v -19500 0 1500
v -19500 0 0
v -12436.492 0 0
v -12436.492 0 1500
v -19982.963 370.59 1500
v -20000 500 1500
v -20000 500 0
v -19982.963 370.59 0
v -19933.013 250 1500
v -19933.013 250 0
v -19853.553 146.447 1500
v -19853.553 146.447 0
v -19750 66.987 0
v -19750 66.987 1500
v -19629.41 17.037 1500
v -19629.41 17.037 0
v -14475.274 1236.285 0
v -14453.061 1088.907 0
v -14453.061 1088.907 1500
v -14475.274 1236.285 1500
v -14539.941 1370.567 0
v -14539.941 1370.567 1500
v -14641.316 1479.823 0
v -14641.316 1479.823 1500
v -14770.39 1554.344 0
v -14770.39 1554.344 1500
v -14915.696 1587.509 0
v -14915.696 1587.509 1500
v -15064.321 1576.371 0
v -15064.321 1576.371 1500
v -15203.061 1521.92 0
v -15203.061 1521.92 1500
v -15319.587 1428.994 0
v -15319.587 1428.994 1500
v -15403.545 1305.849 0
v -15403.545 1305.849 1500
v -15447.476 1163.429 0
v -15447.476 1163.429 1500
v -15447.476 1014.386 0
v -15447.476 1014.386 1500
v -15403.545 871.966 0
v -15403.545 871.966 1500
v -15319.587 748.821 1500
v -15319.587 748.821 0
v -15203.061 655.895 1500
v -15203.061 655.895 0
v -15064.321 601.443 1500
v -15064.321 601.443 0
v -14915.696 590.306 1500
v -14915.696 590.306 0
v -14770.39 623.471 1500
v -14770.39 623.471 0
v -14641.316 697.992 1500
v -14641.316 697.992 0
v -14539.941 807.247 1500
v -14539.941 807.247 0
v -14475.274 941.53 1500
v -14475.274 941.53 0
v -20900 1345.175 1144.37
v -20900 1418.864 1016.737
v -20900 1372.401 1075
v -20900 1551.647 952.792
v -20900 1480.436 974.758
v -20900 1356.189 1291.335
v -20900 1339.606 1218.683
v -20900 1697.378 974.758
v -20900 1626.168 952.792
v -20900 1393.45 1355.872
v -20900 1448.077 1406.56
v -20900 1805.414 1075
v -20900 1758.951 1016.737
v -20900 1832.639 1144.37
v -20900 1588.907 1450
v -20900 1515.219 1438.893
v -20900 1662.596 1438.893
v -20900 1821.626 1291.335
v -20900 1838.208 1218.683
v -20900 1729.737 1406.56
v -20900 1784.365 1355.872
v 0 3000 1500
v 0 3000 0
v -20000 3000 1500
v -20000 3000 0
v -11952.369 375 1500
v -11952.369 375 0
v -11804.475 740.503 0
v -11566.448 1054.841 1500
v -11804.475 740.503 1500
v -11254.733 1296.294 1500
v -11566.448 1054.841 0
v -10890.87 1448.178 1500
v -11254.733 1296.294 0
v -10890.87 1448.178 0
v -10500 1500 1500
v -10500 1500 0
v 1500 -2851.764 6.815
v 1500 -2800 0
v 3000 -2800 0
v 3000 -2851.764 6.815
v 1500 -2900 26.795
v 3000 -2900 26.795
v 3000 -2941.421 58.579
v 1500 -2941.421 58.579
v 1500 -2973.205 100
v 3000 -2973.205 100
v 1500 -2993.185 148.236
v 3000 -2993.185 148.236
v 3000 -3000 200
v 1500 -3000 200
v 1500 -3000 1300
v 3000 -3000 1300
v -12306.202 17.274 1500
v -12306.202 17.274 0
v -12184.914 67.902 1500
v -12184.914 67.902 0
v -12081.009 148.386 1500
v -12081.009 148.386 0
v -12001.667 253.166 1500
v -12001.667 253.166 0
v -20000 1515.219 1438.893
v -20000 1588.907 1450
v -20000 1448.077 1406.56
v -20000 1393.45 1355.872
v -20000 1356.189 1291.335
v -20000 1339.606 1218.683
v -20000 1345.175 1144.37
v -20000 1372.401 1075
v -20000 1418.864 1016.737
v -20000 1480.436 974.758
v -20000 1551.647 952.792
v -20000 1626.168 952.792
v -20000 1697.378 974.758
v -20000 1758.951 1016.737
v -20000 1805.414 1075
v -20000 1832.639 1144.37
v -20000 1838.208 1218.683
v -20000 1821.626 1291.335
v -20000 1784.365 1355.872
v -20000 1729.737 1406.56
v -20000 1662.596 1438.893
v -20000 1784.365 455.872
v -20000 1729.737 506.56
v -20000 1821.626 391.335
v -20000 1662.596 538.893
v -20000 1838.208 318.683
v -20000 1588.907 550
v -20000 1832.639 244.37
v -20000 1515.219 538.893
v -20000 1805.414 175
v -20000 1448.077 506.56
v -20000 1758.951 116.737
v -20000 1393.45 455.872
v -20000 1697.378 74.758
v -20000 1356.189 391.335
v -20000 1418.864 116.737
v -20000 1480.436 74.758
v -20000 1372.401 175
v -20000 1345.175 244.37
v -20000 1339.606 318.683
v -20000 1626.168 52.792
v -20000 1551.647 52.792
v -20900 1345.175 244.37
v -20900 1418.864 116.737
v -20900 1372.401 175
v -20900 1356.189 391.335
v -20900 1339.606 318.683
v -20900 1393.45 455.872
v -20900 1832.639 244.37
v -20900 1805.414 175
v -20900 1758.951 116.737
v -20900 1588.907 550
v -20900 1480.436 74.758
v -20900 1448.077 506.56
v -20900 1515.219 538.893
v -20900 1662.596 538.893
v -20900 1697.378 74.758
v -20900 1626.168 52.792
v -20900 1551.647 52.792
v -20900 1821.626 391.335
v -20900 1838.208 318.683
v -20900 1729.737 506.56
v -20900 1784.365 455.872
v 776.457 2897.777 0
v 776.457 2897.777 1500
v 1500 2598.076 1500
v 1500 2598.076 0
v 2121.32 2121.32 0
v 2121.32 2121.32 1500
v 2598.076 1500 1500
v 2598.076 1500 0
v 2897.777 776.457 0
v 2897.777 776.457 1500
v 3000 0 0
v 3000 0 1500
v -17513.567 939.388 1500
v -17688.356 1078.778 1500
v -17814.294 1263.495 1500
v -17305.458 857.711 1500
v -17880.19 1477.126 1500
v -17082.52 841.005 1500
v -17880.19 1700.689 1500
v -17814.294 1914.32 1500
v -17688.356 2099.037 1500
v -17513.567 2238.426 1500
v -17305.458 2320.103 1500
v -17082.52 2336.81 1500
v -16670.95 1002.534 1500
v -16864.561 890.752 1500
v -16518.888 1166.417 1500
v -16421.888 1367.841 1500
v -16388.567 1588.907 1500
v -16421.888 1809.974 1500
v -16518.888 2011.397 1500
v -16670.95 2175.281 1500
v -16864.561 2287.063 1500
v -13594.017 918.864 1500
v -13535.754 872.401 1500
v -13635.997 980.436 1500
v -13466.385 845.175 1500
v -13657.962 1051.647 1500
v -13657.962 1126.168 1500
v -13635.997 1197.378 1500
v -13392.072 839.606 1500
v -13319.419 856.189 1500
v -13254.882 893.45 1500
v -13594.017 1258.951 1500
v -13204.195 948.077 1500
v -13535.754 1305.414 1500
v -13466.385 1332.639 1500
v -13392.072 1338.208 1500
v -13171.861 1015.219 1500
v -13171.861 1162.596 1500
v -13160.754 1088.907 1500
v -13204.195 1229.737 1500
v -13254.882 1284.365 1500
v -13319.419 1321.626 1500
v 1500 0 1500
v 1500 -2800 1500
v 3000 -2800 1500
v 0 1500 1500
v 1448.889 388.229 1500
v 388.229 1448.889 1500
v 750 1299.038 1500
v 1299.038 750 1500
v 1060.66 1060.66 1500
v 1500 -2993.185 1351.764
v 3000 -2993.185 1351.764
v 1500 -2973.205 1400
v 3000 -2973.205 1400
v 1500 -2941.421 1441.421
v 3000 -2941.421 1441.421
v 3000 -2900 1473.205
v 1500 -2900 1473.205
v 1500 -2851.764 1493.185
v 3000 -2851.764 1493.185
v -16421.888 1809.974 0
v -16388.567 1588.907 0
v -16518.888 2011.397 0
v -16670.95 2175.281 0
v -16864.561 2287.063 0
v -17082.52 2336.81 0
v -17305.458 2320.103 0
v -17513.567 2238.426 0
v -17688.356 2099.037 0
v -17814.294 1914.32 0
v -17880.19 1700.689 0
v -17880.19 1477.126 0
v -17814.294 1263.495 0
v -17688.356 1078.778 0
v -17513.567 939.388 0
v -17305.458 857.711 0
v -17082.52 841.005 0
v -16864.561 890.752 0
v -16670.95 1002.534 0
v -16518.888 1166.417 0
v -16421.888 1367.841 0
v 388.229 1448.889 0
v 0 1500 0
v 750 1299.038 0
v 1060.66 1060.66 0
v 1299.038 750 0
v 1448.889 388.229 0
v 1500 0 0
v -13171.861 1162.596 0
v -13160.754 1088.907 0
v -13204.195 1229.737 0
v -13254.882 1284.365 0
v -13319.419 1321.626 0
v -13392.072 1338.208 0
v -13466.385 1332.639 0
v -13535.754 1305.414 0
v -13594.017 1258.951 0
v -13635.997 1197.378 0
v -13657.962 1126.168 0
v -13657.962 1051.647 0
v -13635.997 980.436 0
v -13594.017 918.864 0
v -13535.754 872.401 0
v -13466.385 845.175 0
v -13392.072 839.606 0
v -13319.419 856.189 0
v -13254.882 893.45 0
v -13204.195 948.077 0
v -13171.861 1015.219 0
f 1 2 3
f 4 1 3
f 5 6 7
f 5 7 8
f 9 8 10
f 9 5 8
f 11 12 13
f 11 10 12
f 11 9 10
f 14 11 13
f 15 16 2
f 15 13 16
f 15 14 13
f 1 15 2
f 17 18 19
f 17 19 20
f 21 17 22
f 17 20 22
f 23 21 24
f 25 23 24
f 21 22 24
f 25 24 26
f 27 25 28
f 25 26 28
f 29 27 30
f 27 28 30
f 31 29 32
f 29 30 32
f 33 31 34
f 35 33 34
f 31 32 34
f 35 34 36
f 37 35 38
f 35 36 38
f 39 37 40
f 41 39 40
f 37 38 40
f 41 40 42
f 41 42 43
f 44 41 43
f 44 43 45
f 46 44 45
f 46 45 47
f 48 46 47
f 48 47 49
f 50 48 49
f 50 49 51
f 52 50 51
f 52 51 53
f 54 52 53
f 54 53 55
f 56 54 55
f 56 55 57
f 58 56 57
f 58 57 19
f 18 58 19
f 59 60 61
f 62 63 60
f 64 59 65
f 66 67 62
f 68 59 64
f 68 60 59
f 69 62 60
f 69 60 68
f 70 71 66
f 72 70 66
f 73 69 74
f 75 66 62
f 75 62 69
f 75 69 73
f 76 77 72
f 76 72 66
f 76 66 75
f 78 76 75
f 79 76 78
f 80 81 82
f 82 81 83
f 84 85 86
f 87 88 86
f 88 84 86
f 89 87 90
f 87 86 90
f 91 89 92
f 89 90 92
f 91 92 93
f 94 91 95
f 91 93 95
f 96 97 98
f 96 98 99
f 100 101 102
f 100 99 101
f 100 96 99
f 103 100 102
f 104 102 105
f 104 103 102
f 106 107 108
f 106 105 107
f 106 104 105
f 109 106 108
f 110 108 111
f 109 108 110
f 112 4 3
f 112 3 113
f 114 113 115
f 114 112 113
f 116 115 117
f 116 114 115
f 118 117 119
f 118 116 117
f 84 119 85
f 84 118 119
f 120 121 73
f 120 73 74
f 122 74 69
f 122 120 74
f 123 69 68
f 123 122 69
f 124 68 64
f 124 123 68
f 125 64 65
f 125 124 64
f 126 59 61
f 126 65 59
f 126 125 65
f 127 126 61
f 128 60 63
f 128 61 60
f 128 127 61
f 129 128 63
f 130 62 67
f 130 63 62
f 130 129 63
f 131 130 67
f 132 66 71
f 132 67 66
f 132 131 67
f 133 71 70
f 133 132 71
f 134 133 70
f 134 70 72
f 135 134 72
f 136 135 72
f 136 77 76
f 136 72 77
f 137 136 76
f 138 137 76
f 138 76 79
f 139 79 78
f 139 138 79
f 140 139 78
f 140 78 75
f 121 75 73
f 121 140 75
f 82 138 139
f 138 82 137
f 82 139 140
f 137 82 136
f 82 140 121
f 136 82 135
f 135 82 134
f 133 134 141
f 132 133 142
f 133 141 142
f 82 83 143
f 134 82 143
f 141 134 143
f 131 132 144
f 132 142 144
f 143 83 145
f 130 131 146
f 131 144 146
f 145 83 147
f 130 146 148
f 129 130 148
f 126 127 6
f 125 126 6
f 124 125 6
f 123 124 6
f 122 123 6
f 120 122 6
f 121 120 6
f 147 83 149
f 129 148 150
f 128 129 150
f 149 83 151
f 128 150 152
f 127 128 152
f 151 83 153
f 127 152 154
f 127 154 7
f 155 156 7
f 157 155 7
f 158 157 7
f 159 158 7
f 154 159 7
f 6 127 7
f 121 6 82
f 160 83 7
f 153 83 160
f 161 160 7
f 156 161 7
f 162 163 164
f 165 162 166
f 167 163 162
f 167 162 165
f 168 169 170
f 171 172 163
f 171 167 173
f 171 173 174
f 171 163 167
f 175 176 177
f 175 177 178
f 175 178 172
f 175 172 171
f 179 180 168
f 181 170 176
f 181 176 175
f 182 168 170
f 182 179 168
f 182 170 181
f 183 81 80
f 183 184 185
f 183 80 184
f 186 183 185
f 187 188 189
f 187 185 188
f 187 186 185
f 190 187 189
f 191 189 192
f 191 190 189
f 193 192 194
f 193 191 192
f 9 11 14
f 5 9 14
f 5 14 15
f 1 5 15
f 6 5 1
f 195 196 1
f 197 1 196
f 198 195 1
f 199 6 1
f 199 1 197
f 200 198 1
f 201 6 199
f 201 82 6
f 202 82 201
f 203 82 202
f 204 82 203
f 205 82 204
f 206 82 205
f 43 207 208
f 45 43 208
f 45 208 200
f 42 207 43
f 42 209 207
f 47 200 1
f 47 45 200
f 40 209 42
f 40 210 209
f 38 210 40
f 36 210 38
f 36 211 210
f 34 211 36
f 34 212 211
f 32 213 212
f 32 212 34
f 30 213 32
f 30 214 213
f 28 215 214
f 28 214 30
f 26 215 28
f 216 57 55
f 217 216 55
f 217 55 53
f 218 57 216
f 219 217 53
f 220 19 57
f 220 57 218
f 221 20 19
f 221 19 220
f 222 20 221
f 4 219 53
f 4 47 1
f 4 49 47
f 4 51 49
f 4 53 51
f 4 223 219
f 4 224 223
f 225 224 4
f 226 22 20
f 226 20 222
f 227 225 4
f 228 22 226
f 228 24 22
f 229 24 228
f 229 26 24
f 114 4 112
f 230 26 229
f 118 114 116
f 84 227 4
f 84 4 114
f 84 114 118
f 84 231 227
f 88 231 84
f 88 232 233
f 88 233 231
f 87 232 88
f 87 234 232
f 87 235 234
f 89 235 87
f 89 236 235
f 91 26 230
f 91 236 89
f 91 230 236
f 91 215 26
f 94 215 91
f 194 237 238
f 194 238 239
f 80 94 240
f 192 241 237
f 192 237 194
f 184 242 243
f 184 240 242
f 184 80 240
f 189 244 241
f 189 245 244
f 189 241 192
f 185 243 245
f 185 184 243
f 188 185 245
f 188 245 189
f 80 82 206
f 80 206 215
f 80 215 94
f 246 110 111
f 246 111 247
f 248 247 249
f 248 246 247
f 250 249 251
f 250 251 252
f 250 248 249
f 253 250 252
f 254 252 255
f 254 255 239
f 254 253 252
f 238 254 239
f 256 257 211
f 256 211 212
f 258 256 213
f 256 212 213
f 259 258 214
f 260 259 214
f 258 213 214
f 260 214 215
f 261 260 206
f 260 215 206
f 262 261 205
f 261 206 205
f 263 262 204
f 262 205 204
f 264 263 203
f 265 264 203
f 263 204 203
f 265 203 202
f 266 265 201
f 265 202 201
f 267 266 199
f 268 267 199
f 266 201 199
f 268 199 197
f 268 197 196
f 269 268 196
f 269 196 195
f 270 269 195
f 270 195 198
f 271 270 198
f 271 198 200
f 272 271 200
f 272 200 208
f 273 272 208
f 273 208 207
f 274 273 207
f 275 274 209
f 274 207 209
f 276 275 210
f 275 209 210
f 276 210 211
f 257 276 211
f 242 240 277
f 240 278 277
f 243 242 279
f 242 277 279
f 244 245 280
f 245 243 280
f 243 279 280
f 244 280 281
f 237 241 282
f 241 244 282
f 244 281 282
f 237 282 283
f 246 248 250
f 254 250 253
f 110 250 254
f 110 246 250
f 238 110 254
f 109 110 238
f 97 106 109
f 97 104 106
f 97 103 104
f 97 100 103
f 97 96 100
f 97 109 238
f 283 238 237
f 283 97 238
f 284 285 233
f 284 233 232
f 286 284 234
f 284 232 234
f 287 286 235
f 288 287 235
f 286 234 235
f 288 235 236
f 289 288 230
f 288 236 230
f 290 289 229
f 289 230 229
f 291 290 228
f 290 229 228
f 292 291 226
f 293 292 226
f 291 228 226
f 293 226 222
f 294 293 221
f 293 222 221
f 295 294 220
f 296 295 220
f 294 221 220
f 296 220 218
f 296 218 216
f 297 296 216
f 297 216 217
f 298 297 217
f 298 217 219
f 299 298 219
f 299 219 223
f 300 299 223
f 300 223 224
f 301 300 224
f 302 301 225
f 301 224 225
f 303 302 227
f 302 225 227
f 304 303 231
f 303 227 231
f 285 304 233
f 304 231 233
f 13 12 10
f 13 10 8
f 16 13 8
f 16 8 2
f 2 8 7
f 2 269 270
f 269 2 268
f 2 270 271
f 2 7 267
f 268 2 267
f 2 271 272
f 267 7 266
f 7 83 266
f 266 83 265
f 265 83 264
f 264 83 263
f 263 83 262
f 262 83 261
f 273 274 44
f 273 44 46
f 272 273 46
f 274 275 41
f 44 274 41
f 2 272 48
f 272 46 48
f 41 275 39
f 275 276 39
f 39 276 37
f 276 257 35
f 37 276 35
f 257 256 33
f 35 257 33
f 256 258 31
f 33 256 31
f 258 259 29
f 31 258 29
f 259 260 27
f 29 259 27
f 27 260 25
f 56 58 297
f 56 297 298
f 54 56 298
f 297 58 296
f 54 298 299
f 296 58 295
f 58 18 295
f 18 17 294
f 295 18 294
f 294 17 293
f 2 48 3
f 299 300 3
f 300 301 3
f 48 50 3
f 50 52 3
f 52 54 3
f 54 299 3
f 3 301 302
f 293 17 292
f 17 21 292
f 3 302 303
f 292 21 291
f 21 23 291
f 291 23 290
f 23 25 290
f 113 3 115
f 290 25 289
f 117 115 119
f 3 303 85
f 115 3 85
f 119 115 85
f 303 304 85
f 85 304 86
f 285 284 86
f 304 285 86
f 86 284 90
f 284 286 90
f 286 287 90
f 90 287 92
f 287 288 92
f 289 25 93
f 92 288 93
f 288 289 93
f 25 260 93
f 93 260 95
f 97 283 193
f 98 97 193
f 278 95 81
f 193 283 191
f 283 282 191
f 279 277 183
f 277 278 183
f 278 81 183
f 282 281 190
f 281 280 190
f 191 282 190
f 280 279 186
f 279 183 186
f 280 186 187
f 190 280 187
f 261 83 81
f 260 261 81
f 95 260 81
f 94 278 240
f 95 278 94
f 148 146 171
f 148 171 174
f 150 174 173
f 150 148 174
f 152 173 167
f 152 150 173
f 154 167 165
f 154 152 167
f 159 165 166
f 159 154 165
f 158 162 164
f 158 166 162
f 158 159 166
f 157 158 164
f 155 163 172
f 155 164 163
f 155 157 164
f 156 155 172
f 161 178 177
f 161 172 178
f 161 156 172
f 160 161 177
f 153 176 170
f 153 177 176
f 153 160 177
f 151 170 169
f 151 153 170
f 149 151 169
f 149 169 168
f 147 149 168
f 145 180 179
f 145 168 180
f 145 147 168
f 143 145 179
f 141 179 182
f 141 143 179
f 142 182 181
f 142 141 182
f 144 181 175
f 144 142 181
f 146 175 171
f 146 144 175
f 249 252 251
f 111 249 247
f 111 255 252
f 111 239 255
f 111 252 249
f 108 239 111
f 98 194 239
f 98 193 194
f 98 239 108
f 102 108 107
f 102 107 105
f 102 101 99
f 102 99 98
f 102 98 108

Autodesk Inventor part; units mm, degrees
ref_plane "YZ Plane" through (0, 0, 0) normal (1, 0, 0) x (0, 1, 0)
ref_plane "XZ Plane" through (0, 0, 0) normal (0, 1, 0) x (-1, 0, 0)
ref_plane "XY Plane" through (0, 0, 0) normal (0, 0, 1) x (1, 0, 0)
sketch "Boceto1" plane through (0, 0, 0) normal (0, 0, 1) x (1, 0, 0)
  arc A0 (1500, 0) -> (0, 1500) centre (0, 0) ccw
  arc A1 (3000, 0) -> (0, 3000) centre (0, 0) ccw
  line L0 (3000, 0) -> (3000, -3000)
  line L1 (3000, -3000) -> (1500, -3000)
  line L2 (1500, -3000) -> (1500, 0)
  line L3 (0, 3000) -> (-20000, 3000)
  line L4 (-20000, 3000) -> (-20000, 0)
  line L5 (-20000, 0) -> (-12000, 0)
  arc A2 (-10500, 1500) -> (-12000, 0) centre (-10500, 0) ccw
  line L6 (0, 1500) -> (-10500, 1500)
  dimension "d4" = 3000
  dimension "d5" = 6000
  dimension "d7" = 20000
  dimension "d8" = 8000
  dimension "d10" = 3000
extrude "Extrusión1" add sketch "Boceto1" along normal blind 1500
fillet "Empalme1" radius 500 1 edges at (-12000, 0, 750)
sketch "Boceto2" plane through (0, 0, 1500) normal (0, 0, 1) x (1, 0, 0)
  circle A0 centre (-13410.7545, 1088.9074) radius 250
  circle A1 centre (-14953.0607, 1088.9074) radius 500
  circle A2 centre (-17138.5672, 1588.9074) radius 750
  point P0 (0, 0)
  dimension "d14" = 500
  dimension "d15" = 1000
  dimension "d16" = 1500
extrude "Extrusión2" cut sketch "Boceto2" against normal blind 1500
fillet "Empalme2" radius 500 1 edges at (-20000, 0, 750)
fillet "Empalme3" radius 200 1 edges at (2250, -3000, 1500)
fillet "Empalme4" radius 200 1 edges at (2250, -3000, 0)
sketch "Boceto3" plane through (-20000, 3000, 0) normal (-1, 0, 0) x (0, 0, 1)
  circle A0 centre (300, -1411.0926) radius 250
  circle A1 centre (1200, -1411.0926) radius 250
  point P0 (0, -3000)
  dimension "d24" = 500
  dimension "d26" = 500
extrude "Extrusión3" add sketch "Boceto3" along normal blind 900
properties part number "BRAZO BALSA UNDIMOTRIZ"
